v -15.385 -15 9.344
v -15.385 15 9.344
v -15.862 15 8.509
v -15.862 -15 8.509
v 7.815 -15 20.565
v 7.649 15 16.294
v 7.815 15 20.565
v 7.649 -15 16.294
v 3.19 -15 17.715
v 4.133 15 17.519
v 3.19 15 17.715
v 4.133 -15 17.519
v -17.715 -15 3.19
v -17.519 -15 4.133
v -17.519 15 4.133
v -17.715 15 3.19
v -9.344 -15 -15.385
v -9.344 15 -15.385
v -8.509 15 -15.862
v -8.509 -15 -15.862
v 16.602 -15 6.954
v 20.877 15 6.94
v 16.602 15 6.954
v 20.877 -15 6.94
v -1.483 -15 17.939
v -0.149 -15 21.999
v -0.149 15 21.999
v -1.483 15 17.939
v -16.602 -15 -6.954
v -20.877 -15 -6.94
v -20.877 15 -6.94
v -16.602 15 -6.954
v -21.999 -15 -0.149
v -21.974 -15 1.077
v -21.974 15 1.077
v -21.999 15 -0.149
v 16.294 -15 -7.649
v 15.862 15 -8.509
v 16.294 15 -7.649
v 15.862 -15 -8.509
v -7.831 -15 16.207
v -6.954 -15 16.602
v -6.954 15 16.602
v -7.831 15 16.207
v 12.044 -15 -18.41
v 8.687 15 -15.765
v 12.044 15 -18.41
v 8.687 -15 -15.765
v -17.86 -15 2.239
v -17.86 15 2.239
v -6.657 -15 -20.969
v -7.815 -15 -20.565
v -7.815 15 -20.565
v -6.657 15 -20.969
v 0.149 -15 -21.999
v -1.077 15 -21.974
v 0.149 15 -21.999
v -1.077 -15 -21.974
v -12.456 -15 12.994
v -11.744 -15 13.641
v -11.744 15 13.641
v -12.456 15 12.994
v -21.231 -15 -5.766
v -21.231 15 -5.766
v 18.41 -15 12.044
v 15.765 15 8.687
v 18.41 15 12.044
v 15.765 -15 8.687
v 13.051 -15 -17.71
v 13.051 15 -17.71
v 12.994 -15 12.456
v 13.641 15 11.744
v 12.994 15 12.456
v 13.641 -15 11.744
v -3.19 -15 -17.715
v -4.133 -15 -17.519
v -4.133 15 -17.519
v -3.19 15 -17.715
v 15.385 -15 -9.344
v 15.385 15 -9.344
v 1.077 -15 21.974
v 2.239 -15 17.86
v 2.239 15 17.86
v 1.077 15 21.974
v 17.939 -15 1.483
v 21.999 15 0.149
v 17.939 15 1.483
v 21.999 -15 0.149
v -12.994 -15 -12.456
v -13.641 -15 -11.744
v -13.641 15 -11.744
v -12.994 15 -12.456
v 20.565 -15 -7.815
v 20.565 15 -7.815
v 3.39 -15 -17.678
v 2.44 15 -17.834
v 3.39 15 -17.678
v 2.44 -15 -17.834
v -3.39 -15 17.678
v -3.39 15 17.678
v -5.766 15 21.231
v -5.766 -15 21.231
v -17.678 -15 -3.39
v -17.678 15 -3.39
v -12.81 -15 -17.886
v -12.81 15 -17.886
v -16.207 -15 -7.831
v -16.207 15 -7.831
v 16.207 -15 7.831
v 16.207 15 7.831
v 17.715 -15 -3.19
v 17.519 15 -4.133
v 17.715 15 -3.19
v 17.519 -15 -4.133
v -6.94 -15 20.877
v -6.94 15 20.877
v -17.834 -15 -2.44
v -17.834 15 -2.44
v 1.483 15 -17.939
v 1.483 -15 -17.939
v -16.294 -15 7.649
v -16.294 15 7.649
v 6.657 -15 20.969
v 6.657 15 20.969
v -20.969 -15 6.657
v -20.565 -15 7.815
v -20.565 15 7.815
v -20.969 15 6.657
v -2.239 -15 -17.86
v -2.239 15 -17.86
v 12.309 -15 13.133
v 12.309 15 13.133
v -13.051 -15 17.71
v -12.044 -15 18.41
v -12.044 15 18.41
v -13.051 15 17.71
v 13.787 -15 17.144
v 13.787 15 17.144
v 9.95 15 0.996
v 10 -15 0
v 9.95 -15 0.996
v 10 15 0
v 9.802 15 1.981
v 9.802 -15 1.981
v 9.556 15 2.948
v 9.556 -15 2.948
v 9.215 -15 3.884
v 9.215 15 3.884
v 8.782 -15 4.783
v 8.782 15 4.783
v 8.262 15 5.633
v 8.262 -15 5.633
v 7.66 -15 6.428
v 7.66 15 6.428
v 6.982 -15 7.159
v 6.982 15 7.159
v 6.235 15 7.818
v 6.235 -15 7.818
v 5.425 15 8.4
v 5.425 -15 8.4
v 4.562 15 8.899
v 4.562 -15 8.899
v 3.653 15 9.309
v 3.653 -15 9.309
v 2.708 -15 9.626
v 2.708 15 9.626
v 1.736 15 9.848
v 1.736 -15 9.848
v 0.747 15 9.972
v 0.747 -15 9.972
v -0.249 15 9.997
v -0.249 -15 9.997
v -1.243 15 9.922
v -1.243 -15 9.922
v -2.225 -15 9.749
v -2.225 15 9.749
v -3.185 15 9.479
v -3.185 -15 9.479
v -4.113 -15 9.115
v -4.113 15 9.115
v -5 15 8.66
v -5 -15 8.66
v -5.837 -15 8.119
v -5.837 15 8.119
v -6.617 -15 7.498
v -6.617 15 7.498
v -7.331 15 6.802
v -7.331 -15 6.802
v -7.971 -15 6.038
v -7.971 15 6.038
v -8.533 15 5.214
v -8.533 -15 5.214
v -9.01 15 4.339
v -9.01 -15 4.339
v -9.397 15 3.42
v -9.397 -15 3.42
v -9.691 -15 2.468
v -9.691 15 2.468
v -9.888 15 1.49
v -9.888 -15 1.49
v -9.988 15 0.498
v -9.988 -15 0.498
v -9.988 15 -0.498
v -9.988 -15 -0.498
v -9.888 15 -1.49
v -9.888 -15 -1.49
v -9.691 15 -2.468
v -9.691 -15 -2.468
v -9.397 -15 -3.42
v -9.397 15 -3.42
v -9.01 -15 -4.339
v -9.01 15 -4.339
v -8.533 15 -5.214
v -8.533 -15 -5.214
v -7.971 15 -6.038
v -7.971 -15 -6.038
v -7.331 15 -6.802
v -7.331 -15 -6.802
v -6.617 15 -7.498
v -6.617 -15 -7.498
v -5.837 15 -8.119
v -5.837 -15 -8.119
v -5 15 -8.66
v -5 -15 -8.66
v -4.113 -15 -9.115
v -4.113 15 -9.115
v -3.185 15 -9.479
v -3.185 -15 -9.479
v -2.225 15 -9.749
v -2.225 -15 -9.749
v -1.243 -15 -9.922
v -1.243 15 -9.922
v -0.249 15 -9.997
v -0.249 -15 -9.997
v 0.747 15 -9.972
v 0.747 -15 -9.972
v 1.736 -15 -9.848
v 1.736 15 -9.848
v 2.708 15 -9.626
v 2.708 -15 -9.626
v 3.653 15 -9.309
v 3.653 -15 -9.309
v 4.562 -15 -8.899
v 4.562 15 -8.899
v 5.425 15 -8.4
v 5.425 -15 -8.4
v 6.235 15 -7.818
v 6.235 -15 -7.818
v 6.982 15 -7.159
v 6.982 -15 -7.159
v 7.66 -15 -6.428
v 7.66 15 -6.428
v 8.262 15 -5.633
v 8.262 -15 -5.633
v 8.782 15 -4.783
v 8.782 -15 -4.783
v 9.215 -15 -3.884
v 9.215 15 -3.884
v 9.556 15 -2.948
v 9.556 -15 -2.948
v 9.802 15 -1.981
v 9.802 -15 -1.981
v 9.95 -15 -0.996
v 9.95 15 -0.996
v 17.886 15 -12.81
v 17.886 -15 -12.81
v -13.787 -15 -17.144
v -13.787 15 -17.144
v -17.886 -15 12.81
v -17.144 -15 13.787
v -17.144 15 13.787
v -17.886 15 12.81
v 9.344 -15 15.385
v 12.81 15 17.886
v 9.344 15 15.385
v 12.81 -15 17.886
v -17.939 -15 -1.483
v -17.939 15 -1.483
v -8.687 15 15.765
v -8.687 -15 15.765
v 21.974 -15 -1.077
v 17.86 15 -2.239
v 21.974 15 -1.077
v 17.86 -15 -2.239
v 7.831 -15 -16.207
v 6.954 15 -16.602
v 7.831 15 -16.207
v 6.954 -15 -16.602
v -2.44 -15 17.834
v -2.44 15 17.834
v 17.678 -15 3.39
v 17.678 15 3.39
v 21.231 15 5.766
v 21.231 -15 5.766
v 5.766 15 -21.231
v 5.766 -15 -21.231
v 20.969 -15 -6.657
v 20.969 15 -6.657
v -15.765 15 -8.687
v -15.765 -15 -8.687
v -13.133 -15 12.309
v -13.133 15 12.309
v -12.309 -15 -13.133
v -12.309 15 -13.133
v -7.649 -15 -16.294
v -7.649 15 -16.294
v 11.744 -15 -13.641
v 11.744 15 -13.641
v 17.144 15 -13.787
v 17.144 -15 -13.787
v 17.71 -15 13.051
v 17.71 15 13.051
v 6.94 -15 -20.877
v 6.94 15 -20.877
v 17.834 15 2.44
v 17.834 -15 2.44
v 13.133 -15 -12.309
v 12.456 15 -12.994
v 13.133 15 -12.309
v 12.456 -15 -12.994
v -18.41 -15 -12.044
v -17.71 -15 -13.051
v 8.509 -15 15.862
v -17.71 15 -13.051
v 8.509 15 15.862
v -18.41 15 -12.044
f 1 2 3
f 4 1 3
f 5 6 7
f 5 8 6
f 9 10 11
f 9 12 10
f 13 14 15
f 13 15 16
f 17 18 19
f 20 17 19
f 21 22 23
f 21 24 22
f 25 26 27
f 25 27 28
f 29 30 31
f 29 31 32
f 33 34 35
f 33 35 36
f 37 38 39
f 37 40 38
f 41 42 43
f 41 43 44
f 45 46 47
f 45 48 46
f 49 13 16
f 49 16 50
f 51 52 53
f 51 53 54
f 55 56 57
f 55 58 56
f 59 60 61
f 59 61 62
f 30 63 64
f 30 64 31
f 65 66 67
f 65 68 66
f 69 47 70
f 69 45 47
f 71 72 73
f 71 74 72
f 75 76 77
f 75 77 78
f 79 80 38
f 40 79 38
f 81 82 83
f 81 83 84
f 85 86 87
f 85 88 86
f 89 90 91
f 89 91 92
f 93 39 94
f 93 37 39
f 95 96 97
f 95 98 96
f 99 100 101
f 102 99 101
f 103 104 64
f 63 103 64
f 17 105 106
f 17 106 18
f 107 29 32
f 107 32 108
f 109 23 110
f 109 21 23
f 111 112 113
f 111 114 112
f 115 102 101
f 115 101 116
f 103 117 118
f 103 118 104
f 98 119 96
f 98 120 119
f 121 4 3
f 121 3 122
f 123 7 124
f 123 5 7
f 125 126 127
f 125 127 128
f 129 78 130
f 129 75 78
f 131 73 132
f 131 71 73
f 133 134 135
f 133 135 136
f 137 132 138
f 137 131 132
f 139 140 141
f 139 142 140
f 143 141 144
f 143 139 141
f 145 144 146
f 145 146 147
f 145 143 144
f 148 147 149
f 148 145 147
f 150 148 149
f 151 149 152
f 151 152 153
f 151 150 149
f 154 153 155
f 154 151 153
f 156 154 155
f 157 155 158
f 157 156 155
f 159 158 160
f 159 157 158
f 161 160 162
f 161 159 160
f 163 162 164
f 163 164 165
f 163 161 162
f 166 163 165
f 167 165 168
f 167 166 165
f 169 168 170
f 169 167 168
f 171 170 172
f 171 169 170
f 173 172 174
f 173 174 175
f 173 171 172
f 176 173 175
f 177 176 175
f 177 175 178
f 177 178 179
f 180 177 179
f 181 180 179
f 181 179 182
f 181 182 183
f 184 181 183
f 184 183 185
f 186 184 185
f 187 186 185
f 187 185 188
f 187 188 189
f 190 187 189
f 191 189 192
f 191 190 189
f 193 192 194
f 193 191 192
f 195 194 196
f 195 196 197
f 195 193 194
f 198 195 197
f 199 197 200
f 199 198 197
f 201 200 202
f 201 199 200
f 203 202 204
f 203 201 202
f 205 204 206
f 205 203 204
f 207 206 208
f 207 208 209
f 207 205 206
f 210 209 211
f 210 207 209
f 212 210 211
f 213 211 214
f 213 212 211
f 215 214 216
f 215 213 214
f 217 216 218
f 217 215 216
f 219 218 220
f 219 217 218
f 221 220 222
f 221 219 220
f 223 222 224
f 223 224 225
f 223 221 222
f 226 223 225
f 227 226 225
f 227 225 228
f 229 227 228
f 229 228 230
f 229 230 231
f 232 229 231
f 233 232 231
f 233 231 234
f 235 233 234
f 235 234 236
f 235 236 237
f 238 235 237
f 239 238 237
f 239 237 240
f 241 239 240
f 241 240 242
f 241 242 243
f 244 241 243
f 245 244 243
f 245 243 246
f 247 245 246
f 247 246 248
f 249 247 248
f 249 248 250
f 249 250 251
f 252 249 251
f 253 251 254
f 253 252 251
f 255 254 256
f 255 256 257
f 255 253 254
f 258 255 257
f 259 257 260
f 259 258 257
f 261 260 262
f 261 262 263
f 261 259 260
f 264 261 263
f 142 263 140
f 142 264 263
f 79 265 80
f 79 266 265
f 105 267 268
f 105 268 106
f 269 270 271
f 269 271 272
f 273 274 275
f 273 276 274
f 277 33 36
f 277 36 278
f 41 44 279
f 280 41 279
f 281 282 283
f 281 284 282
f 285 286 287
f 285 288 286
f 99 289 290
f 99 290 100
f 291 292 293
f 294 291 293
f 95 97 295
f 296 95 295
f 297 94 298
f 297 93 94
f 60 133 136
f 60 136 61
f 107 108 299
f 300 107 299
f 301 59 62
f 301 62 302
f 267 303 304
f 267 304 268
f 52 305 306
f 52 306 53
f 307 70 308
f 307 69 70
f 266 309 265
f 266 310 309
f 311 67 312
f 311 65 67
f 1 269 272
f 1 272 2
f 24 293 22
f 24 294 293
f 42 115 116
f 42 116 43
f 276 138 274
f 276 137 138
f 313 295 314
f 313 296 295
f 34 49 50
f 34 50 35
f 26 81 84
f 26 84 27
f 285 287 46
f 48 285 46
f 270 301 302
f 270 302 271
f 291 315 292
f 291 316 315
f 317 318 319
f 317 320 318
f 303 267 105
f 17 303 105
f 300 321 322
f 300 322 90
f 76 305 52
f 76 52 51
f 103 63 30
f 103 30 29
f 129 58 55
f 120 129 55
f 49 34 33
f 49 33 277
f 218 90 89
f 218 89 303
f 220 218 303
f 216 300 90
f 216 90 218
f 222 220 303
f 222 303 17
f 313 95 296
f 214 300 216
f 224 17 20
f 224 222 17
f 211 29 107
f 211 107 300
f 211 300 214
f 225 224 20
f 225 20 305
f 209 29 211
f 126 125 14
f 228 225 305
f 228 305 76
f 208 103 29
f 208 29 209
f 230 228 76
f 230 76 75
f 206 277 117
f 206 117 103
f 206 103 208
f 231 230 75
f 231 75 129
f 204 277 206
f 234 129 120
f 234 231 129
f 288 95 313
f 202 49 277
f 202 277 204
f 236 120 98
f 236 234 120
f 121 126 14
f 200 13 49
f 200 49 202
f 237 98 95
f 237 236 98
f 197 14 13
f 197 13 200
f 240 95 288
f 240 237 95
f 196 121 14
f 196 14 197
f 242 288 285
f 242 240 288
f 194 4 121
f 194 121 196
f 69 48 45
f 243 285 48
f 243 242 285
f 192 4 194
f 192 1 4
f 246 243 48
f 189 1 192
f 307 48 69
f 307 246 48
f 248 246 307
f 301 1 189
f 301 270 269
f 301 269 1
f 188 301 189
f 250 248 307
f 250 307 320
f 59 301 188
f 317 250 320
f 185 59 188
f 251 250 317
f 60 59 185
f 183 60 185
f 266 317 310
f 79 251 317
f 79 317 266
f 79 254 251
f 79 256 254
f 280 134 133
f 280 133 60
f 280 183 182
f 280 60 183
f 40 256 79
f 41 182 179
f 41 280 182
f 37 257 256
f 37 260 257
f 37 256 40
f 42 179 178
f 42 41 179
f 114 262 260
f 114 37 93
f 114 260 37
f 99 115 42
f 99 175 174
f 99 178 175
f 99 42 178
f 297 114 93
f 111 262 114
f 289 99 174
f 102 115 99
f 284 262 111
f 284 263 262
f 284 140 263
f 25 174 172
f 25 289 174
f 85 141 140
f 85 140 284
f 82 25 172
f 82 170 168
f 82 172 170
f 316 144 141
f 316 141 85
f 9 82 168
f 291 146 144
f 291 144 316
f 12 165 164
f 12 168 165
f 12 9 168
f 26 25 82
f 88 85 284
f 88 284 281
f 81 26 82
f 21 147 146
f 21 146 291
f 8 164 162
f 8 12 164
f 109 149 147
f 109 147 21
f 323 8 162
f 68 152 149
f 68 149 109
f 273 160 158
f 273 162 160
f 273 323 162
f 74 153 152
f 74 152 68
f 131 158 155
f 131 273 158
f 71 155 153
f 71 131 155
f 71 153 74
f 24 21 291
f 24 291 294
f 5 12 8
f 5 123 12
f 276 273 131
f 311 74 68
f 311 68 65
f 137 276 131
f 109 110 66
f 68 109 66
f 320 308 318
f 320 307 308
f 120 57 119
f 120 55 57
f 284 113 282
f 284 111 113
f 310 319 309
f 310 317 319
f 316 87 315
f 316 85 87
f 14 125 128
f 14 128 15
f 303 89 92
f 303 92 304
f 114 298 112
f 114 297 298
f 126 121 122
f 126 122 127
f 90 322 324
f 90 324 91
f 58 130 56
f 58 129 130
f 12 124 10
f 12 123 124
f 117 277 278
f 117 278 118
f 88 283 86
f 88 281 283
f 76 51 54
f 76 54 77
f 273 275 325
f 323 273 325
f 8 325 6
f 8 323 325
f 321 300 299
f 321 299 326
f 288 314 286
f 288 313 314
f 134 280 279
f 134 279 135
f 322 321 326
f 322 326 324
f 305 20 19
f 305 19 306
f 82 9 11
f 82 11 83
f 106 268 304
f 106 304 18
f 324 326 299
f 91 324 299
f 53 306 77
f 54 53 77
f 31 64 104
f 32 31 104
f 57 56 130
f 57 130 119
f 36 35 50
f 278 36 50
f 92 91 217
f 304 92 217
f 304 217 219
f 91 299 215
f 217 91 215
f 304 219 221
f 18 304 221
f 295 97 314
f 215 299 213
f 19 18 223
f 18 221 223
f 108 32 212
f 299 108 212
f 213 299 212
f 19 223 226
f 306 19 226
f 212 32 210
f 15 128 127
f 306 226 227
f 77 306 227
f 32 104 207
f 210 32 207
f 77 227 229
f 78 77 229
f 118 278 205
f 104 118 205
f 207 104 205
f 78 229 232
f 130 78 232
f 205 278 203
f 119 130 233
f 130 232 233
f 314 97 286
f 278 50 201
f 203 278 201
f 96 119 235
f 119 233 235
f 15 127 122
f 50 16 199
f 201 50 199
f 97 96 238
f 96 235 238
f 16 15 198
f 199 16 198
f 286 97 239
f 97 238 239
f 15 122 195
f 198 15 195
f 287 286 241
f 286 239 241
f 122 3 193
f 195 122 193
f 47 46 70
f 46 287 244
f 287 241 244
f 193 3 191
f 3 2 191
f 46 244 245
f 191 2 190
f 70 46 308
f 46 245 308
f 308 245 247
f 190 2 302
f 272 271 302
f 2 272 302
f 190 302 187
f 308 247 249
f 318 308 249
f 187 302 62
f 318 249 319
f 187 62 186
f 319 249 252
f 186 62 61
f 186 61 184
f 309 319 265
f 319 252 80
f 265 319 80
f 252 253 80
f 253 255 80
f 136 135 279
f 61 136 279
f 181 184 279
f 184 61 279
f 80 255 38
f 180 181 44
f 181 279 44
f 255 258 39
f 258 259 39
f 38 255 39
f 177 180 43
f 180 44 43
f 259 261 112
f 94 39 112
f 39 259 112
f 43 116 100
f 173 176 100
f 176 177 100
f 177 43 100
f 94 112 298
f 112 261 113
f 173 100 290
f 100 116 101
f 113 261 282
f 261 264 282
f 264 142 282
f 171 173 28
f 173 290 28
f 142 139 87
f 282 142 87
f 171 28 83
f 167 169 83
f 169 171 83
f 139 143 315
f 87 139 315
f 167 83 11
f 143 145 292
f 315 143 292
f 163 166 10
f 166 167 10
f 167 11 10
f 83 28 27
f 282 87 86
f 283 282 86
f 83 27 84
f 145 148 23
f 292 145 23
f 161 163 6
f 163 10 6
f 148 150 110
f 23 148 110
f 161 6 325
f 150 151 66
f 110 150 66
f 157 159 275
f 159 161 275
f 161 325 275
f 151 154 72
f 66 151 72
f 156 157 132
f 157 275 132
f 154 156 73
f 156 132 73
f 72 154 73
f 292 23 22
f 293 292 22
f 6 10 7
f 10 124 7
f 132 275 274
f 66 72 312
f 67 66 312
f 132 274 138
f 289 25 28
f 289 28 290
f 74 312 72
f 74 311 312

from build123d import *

# Parameters (mm, degrees)
F0_R     = 10
F1_DEPTH = 15


with BuildPart() as f1:
    # F0 (on Front) → F1 (new body, symmetric)
    with BuildSketch(Plane.XZ):
        Polygon((4.132737753, 17.5191460598), (3.1904651552, 17.7149917328), (2.2390718331, 17.8601947729), (1.0773774715, 21.9736036595), (-0.1489718291, 21.9994956168), (-1.4832466893, 17.9387842191), (-2.4399208248, 17.8338662765), (-3.3896198503, 17.6779658691), (-5.7655700937, 21.2310668949), (-6.9398986421, 20.8767288347), (-6.9540406112, 16.6024491921), (-7.8314703545, 16.2070377332), (-8.686511926, 15.7652944965), (-12.044143487, 18.4102853771), (-13.0514998229, 17.7104023775), (-11.7441245865, 13.6409507622), (-12.4564210009, 12.9937514156), (-13.1331076918, 12.3094062552), (-17.1437521993, 13.7873768545), (-17.8855292658, 12.81045834), (-15.3846118211, 9.3441810296), (-15.8620503707, 8.5085461765), (-16.294143373, 7.648587565), (-20.5652109988, 7.8148638232), (-20.9687984885, 6.6565373844), (-17.5191460598, 4.132737753), (-17.7149917328, 3.1904651552), (-17.8601947729, 2.2390718331), (-21.9736036595, 1.0773774715), (-21.9994956168, -0.1489718291), (-17.9387842191, -1.4832466893), (-17.8338662765, -2.4399208248), (-17.6779658691, -3.3896198503), (-21.2310668949, -5.7655700937), (-20.8767288347, -6.9398986421), (-16.6024491921, -6.9540406112), (-16.2070377332, -7.8314703545), (-15.7652944965, -8.686511926), (-18.4102853771, -12.044143487), (-17.7104023775, -13.0514998229), (-13.6409507622, -11.7441245865), (-12.9937514156, -12.4564210009), (-12.3094062552, -13.1331076918), (-13.7873768545, -17.1437521993), (-12.81045834, -17.8855292658), (-9.3441810296, -15.3846118211), (-8.5085461765, -15.8620503707), (-7.648587565, -16.294143373), (-7.8148638232, -20.5652109988), (-6.6565373844, -20.9687984885), (-4.132737753, -17.5191460598), (-3.1904651552, -17.7149917328), (-2.2390718331, -17.8601947729), (-1.0773774715, -21.9736036595), (0.1489718291, -21.9994956168), (1.4832466893, -17.9387842191), (2.4399208248, -17.8338662765), (3.3896198503, -17.6779658691), (5.7655700937, -21.2310668949), (6.9398986421, -20.8767288347), (6.9540406112, -16.6024491921), (7.8314703545, -16.2070377332), (8.686511926, -15.7652944965), (12.044143487, -18.4102853771), (13.0514998229, -17.7104023775), (11.7441245865, -13.6409507622), (12.4564210009, -12.9937514156), (13.1331076918, -12.3094062552), (17.1437521993, -13.7873768545), (17.8855292658, -12.81045834), (15.3846118211, -9.3441810296), (15.8620503707, -8.5085461765), (16.294143373, -7.648587565), (20.5652109988, -7.8148638232), (20.9687984885, -6.6565373844), (17.5191460598, -4.132737753), (17.7149917328, -3.1904651552), (17.8601947729, -2.2390718331), (21.9736036595, -1.0773774715), (21.9994956168, 0.1489718291), (17.9387842191, 1.4832466893), (17.8338662765, 2.4399208248), (17.6779658691, 3.3896198503), (21.2310668949, 5.7655700937), (20.8767288347, 6.9398986421), (16.6024491921, 6.9540406112), (16.2070377332, 7.8314703545), (15.7652944965, 8.686511926), (18.4102853771, 12.044143487), (17.7104023775, 13.0514998229), (13.6409507622, 11.7441245865), (12.9937514156, 12.4564210009), (12.3094062552, 13.1331076918), (13.7873768545, 17.1437521993), (12.81045834, 17.8855292658), (9.3441810296, 15.3846118211), (8.5085461765, 15.8620503707), (7.648587565, 16.294143373), (7.8148638232, 20.5652109988), (6.6565373844, 20.9687984885), align=None)
        Circle(F0_R, mode=Mode.SUBTRACT)
    extrude(amount=F1_DEPTH, both=True)


solid = f1.part
